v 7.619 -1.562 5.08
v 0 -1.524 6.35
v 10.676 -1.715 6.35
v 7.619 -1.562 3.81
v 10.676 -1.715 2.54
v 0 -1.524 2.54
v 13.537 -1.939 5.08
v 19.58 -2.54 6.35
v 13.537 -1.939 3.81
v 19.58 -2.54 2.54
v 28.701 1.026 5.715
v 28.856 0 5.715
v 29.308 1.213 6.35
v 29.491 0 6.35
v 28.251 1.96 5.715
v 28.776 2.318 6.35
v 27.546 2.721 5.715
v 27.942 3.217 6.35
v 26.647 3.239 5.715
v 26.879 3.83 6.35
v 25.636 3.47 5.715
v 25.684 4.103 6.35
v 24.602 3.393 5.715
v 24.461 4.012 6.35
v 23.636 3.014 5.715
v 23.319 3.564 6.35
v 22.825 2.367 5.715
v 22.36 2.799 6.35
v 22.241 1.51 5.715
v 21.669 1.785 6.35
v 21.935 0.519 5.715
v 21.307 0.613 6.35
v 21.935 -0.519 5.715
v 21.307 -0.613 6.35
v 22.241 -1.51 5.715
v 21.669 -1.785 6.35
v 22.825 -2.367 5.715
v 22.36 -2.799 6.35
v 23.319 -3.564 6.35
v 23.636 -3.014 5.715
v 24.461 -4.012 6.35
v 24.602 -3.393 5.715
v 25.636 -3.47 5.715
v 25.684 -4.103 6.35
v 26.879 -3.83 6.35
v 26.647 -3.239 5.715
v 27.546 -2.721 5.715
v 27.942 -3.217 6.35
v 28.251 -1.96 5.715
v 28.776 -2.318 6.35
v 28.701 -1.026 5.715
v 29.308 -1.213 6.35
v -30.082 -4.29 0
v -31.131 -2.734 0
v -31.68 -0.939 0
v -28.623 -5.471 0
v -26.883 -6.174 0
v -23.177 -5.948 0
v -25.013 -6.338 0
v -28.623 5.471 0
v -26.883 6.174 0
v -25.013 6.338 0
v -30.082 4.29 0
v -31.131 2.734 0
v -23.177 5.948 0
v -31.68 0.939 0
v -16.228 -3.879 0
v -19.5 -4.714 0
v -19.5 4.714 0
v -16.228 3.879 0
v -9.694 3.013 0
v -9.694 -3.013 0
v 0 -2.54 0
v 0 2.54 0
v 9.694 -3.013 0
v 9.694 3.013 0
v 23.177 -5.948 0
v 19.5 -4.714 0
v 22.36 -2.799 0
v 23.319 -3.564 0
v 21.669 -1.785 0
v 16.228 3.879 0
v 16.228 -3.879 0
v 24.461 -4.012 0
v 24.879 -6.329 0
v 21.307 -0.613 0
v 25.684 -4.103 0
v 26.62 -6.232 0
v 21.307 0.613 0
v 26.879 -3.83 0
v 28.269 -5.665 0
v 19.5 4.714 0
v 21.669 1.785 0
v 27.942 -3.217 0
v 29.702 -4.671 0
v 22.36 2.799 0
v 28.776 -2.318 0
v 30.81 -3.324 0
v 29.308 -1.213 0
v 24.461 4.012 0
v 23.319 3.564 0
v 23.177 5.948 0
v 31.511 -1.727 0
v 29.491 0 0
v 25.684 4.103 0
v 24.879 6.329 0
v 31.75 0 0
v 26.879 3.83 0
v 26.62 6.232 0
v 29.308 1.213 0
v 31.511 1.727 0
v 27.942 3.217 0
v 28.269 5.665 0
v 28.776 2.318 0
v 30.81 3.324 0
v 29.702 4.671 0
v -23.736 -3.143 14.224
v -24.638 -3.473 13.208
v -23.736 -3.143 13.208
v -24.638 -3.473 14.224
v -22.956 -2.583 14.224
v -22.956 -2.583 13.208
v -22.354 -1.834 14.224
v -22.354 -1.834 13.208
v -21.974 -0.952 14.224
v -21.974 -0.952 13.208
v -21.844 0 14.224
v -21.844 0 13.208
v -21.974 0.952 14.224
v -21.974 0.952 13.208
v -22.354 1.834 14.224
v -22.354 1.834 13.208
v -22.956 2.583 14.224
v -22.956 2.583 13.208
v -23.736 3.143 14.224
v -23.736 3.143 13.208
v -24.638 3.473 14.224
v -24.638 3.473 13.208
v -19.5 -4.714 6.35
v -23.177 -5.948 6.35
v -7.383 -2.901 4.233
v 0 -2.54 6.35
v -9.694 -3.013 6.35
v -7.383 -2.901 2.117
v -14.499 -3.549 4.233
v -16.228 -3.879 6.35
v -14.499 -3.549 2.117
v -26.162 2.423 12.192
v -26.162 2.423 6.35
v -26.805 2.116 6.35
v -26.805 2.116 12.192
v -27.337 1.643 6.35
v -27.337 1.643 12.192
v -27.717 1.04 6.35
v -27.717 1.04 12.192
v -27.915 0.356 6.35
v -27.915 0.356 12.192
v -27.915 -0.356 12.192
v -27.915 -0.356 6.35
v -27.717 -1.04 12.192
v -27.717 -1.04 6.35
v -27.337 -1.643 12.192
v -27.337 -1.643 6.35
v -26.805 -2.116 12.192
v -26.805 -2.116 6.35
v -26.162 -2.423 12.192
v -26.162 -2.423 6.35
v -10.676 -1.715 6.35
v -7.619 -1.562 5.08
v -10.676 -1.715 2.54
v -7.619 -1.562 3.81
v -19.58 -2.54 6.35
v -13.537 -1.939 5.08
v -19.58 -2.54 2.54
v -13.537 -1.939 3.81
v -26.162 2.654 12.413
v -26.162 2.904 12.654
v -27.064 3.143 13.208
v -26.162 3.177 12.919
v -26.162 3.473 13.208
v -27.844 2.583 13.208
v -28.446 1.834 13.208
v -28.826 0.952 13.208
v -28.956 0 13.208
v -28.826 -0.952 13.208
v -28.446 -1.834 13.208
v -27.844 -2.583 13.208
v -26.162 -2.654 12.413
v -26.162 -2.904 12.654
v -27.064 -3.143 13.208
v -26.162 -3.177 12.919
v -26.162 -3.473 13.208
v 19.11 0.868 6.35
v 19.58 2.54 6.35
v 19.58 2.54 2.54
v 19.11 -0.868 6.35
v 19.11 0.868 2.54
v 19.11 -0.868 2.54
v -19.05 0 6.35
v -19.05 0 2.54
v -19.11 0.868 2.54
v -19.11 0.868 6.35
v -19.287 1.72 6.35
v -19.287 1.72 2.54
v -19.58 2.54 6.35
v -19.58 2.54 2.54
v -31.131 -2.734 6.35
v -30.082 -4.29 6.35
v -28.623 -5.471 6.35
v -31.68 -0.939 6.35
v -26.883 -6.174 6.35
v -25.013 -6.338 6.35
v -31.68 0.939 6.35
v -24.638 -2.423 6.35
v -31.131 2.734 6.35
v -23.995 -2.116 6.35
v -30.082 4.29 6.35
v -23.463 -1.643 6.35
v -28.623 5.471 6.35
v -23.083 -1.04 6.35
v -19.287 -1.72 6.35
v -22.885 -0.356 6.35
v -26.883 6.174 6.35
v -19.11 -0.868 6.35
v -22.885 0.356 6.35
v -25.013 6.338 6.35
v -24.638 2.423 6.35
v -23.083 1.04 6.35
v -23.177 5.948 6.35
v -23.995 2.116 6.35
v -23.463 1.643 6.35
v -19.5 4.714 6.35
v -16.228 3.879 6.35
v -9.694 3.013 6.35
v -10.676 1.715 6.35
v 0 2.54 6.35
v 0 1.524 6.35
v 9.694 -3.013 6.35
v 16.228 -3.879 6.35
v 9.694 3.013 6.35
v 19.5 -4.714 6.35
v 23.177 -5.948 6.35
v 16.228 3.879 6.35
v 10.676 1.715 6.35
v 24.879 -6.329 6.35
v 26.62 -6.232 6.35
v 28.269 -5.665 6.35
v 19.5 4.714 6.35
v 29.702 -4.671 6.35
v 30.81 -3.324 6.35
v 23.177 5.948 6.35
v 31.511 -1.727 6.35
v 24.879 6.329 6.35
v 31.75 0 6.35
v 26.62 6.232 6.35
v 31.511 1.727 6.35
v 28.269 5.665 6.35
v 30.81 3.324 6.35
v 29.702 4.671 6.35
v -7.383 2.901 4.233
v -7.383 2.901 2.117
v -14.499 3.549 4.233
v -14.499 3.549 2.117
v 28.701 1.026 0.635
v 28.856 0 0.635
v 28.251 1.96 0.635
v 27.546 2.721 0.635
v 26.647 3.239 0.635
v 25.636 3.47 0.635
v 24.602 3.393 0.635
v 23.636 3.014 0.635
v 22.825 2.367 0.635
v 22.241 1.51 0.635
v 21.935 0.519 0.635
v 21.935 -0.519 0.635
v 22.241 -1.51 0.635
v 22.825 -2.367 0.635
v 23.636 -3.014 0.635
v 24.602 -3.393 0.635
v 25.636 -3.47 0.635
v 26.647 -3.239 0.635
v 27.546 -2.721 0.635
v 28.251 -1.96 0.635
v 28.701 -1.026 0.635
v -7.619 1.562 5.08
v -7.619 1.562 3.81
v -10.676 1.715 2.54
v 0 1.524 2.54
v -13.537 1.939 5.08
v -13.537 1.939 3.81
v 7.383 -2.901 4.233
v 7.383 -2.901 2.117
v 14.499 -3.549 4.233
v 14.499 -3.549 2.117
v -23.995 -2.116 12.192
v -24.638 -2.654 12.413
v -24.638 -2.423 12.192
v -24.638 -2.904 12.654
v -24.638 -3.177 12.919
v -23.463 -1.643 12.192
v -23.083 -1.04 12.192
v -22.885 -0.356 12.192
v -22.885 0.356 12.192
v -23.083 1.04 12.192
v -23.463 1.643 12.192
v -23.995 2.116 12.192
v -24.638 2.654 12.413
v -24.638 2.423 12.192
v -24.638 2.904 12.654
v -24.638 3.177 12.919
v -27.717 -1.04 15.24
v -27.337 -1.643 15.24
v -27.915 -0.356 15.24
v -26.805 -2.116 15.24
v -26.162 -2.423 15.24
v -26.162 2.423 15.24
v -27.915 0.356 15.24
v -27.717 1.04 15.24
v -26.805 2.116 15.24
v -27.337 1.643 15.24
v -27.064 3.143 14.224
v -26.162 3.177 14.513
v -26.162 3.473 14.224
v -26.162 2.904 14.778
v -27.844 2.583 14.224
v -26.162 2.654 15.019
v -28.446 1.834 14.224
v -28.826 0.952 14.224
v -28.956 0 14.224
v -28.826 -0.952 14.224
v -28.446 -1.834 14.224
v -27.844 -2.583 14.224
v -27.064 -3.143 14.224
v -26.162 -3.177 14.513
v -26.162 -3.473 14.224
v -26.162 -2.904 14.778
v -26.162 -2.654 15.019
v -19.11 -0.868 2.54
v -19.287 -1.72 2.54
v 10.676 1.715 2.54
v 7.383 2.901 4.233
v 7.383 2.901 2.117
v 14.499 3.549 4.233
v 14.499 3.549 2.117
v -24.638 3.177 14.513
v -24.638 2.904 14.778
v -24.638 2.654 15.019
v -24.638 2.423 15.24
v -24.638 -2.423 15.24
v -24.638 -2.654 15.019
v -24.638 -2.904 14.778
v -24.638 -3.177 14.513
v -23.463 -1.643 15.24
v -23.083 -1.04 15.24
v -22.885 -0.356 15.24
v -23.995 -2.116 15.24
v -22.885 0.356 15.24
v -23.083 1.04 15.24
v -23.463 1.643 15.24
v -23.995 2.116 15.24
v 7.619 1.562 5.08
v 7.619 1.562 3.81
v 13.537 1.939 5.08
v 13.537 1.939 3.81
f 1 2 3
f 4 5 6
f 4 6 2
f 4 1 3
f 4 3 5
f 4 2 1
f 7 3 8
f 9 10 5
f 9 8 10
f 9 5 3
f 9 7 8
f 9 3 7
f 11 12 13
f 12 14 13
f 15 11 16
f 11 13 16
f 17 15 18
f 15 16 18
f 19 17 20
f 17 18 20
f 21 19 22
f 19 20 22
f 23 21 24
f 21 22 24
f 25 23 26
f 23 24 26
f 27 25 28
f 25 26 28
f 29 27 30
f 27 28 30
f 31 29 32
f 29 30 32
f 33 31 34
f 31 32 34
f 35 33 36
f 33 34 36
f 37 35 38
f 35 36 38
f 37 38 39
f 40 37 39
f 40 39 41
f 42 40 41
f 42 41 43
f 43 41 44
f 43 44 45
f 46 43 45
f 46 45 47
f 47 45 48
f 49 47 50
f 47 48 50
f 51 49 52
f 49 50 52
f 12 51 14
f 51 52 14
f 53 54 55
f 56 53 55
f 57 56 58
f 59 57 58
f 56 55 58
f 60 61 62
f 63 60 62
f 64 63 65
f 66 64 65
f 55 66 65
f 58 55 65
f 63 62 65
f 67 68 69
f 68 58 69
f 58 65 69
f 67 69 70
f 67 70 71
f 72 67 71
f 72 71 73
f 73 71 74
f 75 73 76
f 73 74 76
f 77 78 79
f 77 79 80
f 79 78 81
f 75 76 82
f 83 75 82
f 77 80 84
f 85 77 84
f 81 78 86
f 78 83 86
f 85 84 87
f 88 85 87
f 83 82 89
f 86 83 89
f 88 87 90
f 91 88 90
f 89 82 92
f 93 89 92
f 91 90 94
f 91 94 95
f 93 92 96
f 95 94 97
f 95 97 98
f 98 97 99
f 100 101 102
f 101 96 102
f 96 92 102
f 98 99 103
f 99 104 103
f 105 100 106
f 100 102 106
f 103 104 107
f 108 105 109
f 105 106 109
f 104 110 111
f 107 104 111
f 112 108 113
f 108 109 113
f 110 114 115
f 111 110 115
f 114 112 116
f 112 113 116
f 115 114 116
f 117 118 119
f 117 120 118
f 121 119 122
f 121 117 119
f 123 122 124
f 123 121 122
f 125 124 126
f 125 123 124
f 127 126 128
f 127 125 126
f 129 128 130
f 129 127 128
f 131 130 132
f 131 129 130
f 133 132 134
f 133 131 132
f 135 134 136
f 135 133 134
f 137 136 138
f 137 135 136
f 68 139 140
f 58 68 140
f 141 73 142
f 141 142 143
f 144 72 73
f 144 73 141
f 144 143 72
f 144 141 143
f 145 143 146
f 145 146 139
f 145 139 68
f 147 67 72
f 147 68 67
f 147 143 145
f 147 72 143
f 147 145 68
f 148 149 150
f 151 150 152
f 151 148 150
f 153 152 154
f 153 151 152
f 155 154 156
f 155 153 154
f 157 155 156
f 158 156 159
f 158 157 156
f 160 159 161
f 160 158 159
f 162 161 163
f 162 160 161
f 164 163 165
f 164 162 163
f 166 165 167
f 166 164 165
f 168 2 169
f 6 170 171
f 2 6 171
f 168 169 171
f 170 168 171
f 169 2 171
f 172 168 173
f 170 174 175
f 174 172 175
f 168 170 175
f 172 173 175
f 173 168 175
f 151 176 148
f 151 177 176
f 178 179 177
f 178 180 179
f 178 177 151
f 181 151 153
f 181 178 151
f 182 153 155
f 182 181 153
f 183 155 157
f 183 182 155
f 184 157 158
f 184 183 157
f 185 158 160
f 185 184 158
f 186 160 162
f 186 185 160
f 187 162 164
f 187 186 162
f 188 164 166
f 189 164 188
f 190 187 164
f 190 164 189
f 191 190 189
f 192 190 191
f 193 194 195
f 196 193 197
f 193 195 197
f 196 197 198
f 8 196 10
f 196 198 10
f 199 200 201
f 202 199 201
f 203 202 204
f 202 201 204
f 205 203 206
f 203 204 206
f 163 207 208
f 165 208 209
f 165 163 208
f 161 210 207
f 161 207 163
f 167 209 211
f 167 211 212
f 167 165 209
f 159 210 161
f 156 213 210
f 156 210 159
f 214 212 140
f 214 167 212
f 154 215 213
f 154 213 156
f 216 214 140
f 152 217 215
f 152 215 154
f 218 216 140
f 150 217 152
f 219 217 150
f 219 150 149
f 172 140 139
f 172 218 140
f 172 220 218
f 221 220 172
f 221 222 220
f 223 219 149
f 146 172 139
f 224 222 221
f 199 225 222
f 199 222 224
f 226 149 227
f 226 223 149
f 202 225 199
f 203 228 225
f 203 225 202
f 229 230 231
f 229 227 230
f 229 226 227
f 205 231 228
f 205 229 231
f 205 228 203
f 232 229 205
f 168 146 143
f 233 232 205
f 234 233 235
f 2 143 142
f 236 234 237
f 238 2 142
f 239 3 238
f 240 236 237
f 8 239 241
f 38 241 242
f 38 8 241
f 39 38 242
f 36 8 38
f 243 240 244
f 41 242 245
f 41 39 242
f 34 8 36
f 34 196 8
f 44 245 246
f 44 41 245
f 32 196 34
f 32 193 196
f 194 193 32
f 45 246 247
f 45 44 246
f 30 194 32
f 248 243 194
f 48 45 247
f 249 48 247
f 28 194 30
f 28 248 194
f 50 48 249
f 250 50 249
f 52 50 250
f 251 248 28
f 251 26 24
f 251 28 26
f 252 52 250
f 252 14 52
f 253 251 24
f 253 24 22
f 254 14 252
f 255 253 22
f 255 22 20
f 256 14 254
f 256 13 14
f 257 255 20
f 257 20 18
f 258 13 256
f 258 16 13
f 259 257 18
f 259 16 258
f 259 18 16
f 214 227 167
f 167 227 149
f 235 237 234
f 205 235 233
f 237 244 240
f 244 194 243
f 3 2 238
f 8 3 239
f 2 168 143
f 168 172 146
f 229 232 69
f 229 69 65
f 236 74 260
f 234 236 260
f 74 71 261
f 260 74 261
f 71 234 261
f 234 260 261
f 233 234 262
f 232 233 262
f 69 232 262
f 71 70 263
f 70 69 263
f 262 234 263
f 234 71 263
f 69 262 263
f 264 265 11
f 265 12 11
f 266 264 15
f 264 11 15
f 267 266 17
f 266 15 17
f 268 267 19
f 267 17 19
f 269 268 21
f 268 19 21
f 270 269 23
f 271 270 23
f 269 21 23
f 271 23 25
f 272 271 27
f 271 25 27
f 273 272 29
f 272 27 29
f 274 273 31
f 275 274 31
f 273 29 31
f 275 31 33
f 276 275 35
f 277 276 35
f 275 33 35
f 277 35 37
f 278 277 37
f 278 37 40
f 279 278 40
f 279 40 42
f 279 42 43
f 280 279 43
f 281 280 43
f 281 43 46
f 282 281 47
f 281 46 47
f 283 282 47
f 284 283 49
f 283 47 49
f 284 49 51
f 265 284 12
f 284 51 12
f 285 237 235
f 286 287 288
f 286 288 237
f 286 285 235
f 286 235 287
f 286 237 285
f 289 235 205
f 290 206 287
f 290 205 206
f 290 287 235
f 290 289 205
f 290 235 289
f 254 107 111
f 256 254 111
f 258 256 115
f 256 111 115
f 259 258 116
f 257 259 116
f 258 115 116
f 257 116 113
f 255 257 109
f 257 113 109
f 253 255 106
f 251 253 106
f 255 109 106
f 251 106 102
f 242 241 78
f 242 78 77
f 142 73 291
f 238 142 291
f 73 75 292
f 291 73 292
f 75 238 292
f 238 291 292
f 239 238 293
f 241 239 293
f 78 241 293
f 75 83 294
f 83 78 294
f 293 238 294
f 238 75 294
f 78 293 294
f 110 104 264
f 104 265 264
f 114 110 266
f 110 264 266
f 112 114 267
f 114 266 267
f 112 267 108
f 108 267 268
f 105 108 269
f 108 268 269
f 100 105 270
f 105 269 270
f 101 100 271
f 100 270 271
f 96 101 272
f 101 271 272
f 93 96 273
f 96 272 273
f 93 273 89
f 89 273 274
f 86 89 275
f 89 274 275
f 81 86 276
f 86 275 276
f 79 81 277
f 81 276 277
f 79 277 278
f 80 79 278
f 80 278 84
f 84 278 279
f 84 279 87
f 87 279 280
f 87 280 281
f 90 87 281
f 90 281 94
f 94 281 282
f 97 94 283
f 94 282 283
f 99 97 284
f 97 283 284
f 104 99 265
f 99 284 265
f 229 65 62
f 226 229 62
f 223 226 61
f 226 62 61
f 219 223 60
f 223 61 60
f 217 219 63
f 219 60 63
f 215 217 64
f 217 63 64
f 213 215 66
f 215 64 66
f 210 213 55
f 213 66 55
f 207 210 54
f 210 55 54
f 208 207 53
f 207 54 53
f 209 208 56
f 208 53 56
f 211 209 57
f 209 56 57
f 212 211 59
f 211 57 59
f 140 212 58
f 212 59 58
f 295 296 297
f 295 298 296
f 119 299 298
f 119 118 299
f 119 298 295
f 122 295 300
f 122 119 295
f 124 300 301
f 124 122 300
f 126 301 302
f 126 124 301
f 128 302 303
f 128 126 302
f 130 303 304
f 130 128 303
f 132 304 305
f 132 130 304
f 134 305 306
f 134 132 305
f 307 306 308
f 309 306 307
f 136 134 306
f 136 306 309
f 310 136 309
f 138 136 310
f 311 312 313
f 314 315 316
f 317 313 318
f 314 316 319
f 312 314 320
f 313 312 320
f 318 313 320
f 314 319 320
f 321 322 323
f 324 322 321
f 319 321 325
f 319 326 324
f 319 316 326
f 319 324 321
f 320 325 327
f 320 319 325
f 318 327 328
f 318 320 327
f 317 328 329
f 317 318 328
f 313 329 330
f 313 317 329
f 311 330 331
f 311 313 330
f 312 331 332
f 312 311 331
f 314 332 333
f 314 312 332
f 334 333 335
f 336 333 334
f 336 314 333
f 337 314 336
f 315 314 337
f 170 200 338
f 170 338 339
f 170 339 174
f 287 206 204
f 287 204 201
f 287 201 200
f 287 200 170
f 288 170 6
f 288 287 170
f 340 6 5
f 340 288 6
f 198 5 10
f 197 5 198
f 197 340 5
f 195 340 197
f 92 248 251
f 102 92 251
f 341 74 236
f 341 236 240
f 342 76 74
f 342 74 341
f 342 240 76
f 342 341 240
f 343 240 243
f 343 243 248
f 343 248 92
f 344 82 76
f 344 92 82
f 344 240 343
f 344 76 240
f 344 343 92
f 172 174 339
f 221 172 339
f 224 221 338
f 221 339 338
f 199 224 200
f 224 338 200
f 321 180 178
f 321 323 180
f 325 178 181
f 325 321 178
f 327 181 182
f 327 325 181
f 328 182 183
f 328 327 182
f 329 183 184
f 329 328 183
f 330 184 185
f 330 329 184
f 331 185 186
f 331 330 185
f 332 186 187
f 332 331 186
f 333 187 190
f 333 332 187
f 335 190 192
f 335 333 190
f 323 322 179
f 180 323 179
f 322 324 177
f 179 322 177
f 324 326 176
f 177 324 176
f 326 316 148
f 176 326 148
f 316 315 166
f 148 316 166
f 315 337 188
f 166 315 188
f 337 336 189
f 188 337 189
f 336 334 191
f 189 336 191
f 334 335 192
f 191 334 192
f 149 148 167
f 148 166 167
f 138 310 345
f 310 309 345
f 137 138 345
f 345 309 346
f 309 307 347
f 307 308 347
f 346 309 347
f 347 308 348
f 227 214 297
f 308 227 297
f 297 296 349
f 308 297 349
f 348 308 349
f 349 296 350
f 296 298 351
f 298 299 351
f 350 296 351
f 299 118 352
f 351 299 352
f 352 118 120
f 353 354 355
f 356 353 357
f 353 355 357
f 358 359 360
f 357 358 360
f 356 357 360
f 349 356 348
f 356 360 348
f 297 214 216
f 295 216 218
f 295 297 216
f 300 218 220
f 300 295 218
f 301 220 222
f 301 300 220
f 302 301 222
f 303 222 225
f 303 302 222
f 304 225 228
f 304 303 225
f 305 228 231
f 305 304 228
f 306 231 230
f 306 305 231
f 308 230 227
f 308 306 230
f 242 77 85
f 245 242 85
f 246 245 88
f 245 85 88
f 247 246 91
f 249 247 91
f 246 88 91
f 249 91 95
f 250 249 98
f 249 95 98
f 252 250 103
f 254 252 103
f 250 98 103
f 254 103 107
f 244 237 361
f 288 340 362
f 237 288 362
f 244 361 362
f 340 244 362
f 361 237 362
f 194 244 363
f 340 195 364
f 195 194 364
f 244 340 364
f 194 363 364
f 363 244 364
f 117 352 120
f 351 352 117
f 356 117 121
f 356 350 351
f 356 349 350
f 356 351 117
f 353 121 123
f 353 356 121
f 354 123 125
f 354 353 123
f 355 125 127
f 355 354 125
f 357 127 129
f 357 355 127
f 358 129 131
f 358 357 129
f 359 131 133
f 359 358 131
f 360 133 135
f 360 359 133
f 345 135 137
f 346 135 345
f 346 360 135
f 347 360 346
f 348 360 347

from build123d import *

# Parameters (mm, degrees)
F2_DEPTH = 6.35
F1_W     = 1.778
F1_H     = 3.048
F1_H_2   = 5.842
F1_W_2   = 0.762
F5_DEPTH = 12.7
F6_DEPTH = 2.54


# Not quite as in the source:
# - a feature names something its author has since deleted; it is built from what else it names


with BuildPart() as f2:
    # F0 (on Top) → F2 (new body)
    with BuildSketch(Plane.XY):
        with BuildLine():
            ThreePointArc((-19.5801208863, -2.5399817128), (-19.1839428746, -1.2973564714), (-19.05, 0))
            ThreePointArc((-19.05, 0), (-19.1839428746, 1.2973564714), (-19.5801208863, 2.5399817128))
            ThreePointArc((-19.5801208863, 2.5399817128), (-21.0323461368, 4.6093491657), (-23.1768579109, 5.9481206487))
            ThreePointArc((-23.1768579109, 5.9481206487), (-31.75, 0), (-23.1768579109, -5.9481206487))
            ThreePointArc((-23.1768579109, -5.9481206487), (-21.0323461368, -4.6093491657), (-19.5801208863, -2.5399817128))
        make_face()
        with BuildLine():
            ThreePointArc((-23.1768579109, 5.9481206487), (-21.0323461368, 4.6093491657), (-19.5801208863, 2.5399817128))
            add(Edge.make_bspline(
                [(0, 1.524), (-9.0764431036, 1.3546369813), (-12.8672626316, 1.8652065321), (-19.5801208863, 2.5399817128)],
                knots=[0, 0, 0, 0, 19.6064620154, 19.6064620154, 19.6064620154, 19.6064620154], degree=3))
            add(Edge.make_bspline(
                [(0, 1.524), (9.0764431036, 1.3546369813), (12.8672626316, 1.8652065321), (19.5801208863, 2.5399817128)],
                knots=[0, 0, 0, 0, 19.6064620154, 19.6064620154, 19.6064620154, 19.6064620154], degree=3))
            ThreePointArc((19.5801208863, 2.5399817128), (21.0323461368, 4.6093491657), (23.1768579109, 5.9481206487))
            add(Edge.make_bspline(
                [(0, 2.54), (8.1250406802, 3.246476237), (13.1090918084, 2.1852389104), (23.1768579109, 5.9481206487)],
                knots=[0, 0, 0, 0, 23.4260971776, 23.4260971776, 23.4260971776, 23.4260971776], degree=3))
            add(Edge.make_bspline(
                [(0, 2.54), (-8.1250406802, 3.246476237), (-13.1090918084, 2.1852389104), (-23.1768579109, 5.9481206487)],
                knots=[0, 0, 0, 0, 23.4260971776, 23.4260971776, 23.4260971776, 23.4260971776], degree=3))
        make_face()
        with BuildLine():
            add(Edge.make_bspline(
                [(0, -1.524), (-9.0764431036, -1.3546369813), (-12.8672626316, -1.8652065321), (-19.5801208863, -2.5399817128)],
                knots=[0, 0, 0, 0, 19.6064620154, 19.6064620154, 19.6064620154, 19.6064620154], degree=3))
            ThreePointArc((-19.5801208863, -2.5399817128), (-21.0323461368, -4.6093491657), (-23.1768579109, -5.9481206487))
            add(Edge.make_bspline(
                [(0, -2.54), (-8.1250406802, -3.246476237), (-13.1090918084, -2.1852389104), (-23.1768579109, -5.9481206487)],
                knots=[0, 0, 0, 0, 23.4260971776, 23.4260971776, 23.4260971776, 23.4260971776], degree=3))
            add(Edge.make_bspline(
                [(0, -2.54), (8.1250406802, -3.246476237), (13.1090918084, -2.1852389104), (23.1768579109, -5.9481206487)],
                knots=[0, 0, 0, 0, 23.4260971776, 23.4260971776, 23.4260971776, 23.4260971776], degree=3))
            ThreePointArc((23.1768579109, -5.9481206487), (21.0323461368, -4.6093491657), (19.5801208863, -2.5399817128))
            add(Edge.make_bspline(
                [(0, -1.524), (9.0764431036, -1.3546369813), (12.8672626316, -1.8652065321), (19.5801208863, -2.5399817128)],
                knots=[0, 0, 0, 0, 19.6064620154, 19.6064620154, 19.6064620154, 19.6064620154], degree=3))
        make_face()
        with BuildLine():
            ThreePointArc((23.1768579109, 5.9481206487), (21.0323461368, 4.6093491657), (19.5801208863, 2.5399817128))
            ThreePointArc((19.5801208863, 2.5399817128), (19.05, 0), (19.5801208863, -2.5399817128))
            ThreePointArc((19.5801208863, -2.5399817128), (21.0323461368, -4.6093491657), (23.1768579109, -5.9481206487))
            ThreePointArc((23.1768579109, -5.9481206487), (29.019775389, -5.2172527381), (31.75, 0))
            ThreePointArc((31.75, 0), (29.019775389, 5.2172527381), (23.1768579109, 5.9481206487))
        make_face()
    extrude(amount=F2_DEPTH)

    # F1 (on Front) → F3 (revolve, cut)
    with BuildSketch(Plane.XZ):
        Polygon((25.376161883, 6.35), (25.376161883, 0), (29.490961883, 0), (28.855961883, 0.635), (28.855961883, 5.715), (29.490961883, 6.35), align=None)
    revolve(axis=Axis((25.376161883, 0, 3.175), (0, 0, 1)), mode=Mode.SUBTRACT)

    # F1 (on Front) → F4 (revolve)
    with BuildSketch(Plane.XZ):
        Polygon((-22.86, 15.24), (-22.86, 12.192), (-21.844, 13.208), (-21.844, 14.224), align=None)
        with Locations((-23.749, 13.716)):
            Rectangle(F1_W, F1_H)
        with Locations((-27.051, 13.716)):
            Rectangle(F1_W, F1_H)
        Polygon((-28.956, 13.208), (-27.94, 12.192), (-27.94, 15.24), (-28.956, 14.224), align=None)
        with Locations((-27.051, 9.271)):
            Rectangle(F1_W, F1_H_2)
        with Locations((-23.749, 9.271)):
            Rectangle(F1_W, F1_H_2)
    revolve(axis=Axis((-25.4, 0, 10.795), (0, 0, 1)))

    # F1 (on Front) → F5 (cut, symmetric)
    with BuildSketch(Plane.XZ):
        with Locations((-25.019, 13.716)):
            Rectangle(F1_W_2, F1_H)
        with Locations((-25.781, 13.716)):
            Rectangle(F1_W_2, F1_H)
        with Locations((-25.019, 9.271)):
            Rectangle(F1_W_2, F1_H_2)
        with Locations((-25.781, 9.271)):
            Rectangle(F1_W_2, F1_H_2)
    extrude(amount=F5_DEPTH, both=True, mode=Mode.SUBTRACT)

    # F0 (on Top) → F6 (join)
    with BuildSketch(Plane.XY):
        with BuildLine():
            ThreePointArc((-19.5801208863, 2.5399817128), (-19.1839428746, 1.2973564714), (-19.05, 0))
            ThreePointArc((-19.05, 0), (-19.1839428746, -1.2973564714), (-19.5801208863, -2.5399817128))
            add(Edge.make_bspline(
                [(0, -1.524), (-9.0764431036, -1.3546369813), (-12.8672626316, -1.8652065321), (-19.5801208863, -2.5399817128)],
                knots=[0, 0, 0, 0, 19.6064620154, 19.6064620154, 19.6064620154, 19.6064620154], degree=3))
            add(Edge.make_bspline(
                [(0, -1.524), (9.0764431036, -1.3546369813), (12.8672626316, -1.8652065321), (19.5801208863, -2.5399817128)],
                knots=[0, 0, 0, 0, 19.6064620154, 19.6064620154, 19.6064620154, 19.6064620154], degree=3))
            ThreePointArc((19.5801208863, -2.5399817128), (19.05, 0), (19.5801208863, 2.5399817128))
            add(Edge.make_bspline(
                [(0, 1.524), (9.0764431036, 1.3546369813), (12.8672626316, 1.8652065321), (19.5801208863, 2.5399817128)],
                knots=[0, 0, 0, 0, 19.6064620154, 19.6064620154, 19.6064620154, 19.6064620154], degree=3))
            add(Edge.make_bspline(
                [(0, 1.524), (-9.0764431036, 1.3546369813), (-12.8672626316, 1.8652065321), (-19.5801208863, 2.5399817128)],
                knots=[0, 0, 0, 0, 19.6064620154, 19.6064620154, 19.6064620154, 19.6064620154], degree=3))
        make_face()
    extrude(amount=F6_DEPTH)


solid = f2.part
